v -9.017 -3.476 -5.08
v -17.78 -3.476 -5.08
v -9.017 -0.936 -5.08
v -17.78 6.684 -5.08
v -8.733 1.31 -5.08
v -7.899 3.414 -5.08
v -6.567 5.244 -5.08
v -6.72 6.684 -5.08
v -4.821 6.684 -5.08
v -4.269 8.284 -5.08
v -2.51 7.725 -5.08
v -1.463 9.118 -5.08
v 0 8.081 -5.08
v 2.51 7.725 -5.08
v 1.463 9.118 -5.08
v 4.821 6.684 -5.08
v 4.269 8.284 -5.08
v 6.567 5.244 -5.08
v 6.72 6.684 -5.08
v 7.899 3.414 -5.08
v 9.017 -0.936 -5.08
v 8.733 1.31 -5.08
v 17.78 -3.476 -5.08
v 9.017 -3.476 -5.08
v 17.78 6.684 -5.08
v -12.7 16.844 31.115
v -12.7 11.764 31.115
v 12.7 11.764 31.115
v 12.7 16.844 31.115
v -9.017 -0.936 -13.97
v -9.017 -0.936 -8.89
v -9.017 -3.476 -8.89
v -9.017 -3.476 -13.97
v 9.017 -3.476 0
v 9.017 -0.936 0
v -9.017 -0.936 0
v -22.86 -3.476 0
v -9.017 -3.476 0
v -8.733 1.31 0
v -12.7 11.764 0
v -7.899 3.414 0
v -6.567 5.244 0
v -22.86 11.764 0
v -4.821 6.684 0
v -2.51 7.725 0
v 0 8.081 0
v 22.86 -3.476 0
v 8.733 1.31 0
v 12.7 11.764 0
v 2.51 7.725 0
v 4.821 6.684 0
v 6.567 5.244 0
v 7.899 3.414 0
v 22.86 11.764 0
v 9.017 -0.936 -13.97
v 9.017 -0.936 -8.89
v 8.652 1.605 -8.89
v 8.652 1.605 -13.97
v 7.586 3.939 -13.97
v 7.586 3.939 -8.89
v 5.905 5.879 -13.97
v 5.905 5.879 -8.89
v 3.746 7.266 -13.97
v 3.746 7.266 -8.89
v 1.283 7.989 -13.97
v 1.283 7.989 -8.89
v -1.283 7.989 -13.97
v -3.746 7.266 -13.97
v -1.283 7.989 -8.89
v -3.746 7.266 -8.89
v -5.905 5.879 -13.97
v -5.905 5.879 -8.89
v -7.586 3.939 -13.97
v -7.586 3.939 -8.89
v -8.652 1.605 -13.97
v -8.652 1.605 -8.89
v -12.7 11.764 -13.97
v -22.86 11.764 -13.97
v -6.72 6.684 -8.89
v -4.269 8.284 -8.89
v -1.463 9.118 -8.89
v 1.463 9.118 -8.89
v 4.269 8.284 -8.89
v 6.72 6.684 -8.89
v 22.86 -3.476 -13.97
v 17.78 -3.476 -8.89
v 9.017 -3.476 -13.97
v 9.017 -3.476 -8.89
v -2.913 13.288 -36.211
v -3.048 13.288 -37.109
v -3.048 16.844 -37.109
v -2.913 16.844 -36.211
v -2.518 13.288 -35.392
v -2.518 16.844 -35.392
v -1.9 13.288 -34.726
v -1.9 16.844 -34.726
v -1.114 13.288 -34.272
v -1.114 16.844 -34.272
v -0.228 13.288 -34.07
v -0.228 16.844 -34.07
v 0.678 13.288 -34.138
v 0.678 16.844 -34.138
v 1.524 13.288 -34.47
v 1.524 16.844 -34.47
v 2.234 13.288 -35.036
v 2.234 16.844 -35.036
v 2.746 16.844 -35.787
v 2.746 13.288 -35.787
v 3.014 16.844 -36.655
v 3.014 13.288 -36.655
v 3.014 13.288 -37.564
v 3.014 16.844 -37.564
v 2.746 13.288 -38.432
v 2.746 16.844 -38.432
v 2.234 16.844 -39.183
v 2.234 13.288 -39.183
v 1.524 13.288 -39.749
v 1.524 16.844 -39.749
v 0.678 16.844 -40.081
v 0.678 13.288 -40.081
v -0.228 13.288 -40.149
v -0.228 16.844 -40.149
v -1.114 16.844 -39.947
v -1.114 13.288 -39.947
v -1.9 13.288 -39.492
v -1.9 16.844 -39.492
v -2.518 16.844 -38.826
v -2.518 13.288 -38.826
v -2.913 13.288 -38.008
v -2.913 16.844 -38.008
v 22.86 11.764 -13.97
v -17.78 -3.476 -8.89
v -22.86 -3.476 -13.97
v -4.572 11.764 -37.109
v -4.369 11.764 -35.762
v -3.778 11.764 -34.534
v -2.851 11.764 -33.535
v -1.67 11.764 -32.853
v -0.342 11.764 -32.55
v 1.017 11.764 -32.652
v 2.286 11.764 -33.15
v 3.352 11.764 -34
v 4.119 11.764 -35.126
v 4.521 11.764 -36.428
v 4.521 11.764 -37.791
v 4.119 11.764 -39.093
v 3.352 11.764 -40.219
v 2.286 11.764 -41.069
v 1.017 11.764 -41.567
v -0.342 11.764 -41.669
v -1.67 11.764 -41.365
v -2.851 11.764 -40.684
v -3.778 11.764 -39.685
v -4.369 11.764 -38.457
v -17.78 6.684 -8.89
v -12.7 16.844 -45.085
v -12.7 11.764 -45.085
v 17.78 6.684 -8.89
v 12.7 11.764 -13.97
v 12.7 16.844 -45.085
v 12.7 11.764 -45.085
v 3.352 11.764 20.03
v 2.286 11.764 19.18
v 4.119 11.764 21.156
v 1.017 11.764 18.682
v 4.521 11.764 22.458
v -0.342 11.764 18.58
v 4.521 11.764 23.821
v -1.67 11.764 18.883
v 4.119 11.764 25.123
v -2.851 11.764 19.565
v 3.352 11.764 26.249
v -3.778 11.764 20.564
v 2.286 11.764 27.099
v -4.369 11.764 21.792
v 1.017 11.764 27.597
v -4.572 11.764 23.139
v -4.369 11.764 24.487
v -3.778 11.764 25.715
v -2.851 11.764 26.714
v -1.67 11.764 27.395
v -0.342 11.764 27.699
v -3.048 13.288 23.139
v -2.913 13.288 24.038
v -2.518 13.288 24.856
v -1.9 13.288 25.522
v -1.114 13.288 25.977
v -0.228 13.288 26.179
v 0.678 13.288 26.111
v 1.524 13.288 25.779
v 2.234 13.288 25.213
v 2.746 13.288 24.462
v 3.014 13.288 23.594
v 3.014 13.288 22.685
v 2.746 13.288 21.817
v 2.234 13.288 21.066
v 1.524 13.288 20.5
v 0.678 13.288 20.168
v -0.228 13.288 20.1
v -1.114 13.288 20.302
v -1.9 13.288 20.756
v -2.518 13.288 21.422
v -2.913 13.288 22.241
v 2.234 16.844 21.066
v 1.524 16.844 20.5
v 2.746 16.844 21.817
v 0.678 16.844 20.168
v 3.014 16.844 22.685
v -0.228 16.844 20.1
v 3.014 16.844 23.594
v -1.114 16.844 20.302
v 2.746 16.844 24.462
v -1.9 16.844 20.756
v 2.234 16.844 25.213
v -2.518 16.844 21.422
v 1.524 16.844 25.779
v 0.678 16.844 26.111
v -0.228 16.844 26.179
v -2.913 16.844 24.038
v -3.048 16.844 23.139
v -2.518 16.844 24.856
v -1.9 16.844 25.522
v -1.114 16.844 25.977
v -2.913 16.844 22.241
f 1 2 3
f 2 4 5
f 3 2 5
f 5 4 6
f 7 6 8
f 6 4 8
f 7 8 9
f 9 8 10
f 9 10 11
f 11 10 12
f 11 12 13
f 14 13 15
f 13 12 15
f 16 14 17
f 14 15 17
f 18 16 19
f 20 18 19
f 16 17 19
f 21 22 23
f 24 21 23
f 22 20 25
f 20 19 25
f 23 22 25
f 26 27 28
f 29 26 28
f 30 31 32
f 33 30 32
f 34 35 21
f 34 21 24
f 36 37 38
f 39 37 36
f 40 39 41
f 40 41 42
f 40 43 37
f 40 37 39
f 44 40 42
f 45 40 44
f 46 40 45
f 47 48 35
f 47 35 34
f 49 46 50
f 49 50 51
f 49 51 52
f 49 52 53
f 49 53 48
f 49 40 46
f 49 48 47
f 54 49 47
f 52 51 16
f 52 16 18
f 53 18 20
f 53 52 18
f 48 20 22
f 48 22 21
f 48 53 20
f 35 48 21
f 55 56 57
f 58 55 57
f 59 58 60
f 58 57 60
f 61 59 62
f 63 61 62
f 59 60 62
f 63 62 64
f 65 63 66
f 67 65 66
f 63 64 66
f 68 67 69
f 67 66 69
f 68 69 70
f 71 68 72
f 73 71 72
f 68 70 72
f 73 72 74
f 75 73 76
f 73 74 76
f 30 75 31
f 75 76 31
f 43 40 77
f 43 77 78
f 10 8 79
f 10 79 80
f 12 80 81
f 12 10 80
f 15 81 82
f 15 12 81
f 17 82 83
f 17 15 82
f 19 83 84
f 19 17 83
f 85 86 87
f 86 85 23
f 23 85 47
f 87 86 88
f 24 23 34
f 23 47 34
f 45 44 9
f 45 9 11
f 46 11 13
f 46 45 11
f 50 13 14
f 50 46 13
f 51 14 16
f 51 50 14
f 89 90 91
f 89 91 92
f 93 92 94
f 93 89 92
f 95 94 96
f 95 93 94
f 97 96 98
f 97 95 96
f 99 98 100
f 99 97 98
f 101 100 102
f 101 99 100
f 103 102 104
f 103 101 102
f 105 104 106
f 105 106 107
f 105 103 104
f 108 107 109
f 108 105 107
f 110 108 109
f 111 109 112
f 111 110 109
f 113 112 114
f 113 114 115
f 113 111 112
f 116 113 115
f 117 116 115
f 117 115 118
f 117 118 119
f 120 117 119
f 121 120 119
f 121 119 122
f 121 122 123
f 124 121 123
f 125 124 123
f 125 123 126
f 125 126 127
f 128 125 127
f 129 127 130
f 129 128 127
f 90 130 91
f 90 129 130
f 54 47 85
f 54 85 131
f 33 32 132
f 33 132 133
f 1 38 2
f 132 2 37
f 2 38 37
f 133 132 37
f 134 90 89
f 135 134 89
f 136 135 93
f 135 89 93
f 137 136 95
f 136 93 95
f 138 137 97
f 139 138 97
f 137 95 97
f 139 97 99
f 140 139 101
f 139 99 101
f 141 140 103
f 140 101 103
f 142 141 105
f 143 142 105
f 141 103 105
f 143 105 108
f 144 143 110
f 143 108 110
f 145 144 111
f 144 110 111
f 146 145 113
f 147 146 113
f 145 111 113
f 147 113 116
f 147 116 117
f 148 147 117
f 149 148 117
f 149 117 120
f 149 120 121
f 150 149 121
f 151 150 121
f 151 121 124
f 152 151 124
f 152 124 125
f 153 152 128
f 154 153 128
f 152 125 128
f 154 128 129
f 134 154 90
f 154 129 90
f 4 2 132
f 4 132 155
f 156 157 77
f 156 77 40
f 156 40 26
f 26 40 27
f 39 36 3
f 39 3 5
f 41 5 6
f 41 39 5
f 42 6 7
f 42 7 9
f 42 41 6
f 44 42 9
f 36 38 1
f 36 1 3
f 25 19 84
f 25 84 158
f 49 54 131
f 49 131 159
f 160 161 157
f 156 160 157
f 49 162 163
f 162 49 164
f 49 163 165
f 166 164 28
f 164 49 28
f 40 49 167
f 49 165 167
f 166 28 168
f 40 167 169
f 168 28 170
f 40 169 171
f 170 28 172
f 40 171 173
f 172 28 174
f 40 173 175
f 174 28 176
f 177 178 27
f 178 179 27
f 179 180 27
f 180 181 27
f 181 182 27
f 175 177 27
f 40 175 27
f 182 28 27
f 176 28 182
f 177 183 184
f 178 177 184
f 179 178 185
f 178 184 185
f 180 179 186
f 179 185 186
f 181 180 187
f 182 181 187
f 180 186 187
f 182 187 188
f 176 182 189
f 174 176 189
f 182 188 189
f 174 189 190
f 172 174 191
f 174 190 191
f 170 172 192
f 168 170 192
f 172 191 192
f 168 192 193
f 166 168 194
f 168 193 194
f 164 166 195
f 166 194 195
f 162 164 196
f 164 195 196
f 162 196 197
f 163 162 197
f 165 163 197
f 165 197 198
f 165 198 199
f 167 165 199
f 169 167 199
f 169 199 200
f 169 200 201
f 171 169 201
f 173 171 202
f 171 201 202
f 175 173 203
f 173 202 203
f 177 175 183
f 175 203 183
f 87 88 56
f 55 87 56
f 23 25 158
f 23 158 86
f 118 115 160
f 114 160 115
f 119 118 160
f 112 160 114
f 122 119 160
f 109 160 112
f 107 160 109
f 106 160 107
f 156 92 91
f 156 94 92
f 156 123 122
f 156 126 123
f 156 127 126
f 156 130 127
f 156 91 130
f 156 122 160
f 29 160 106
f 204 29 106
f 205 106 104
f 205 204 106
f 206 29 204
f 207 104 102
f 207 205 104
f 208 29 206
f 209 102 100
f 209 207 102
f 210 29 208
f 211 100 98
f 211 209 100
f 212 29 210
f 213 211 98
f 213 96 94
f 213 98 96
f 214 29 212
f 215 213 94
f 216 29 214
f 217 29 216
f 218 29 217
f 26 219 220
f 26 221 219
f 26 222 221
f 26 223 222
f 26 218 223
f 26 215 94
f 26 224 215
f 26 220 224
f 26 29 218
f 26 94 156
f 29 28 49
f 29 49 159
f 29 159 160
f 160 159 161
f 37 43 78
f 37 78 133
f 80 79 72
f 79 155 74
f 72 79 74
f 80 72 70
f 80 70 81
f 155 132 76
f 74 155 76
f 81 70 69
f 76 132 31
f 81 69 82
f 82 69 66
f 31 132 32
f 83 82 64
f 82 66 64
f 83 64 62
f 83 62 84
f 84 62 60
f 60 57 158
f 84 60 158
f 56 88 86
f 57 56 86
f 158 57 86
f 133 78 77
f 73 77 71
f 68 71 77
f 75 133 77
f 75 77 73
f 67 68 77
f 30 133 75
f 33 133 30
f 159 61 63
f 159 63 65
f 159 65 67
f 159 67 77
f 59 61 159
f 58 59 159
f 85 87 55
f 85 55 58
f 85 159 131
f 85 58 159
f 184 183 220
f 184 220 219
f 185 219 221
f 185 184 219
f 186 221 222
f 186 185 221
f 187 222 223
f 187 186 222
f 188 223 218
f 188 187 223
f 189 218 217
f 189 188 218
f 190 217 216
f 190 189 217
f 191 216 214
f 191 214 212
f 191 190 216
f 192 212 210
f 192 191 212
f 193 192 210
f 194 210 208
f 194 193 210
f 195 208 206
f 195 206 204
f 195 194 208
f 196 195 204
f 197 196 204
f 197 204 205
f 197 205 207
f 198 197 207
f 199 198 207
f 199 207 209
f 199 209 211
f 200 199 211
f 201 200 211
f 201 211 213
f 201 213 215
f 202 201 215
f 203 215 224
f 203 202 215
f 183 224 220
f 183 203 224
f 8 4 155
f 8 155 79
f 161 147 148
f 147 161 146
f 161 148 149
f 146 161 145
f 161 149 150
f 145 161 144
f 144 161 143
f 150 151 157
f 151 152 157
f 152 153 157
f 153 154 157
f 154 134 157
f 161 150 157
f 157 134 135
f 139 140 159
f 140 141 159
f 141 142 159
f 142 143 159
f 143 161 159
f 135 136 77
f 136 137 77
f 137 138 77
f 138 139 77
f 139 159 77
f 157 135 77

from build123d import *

# Parameters (mm, degrees)
F1_DEPTH = 5.08
F2_DEPTH = 13.97
F3_START = 3.81
F3_DEPTH = 5.08
F4_R     = 3.048
F4_W     = 12.7
F4_H     = 6.985
F5_DEPTH = 5.08
F6_SIZE  = 1.524


with BuildPart() as f1:
    # F0 (on Top) → F1 (new body)
    with BuildSketch(Plane.XY):
        with BuildLine():
            ThreePointArc((-10.16, -0.9357894737), (-9.2602083301, 3.2444188564), (-6.7202083301, 6.6842105263))
            Line((-6.7202083301, 6.6842105263), (-17.78, 6.6842105263))
            Line((-17.78, 6.6842105263), (-17.78, -3.4757894737))
            Line((-17.78, -3.4757894737), (-10.16, -3.4757894737))
            Line((-10.16, -3.4757894737), (-10.16, -0.9357894737))
        make_face()
        with BuildLine():
            Line((17.78, 6.6842105263), (6.7202083301, 6.6842105263))
            ThreePointArc((6.7202083301, 6.6842105263), (9.2602083301, 3.2444188564), (10.16, -0.9357894737))
            Line((10.16, -0.9357894737), (10.16, -3.4757894737))
            Line((10.16, -3.4757894737), (17.78, -3.4757894737))
            Line((17.78, -3.4757894737), (17.78, 6.6842105263))
        make_face()
        with BuildLine():
            Line((-9.017, -3.4757894737), (-9.017, -0.9357894737))
            ThreePointArc((-9.017, -0.9357894737), (-7.8986424103, 3.4136630291), (-4.8209842356, 6.6842105263))
            Line((-4.8209842356, 6.6842105263), (-6.7202083301, 6.6842105263))
            ThreePointArc((-6.7202083301, 6.6842105263), (-9.2602083301, 3.2444188564), (-10.16, -0.9357894737))
            ThreePointArc((-10.16, -0.9357894737), (-10.0790217141, -2.2159930853), (-9.8373776994, -3.4757894737))
            Line((-9.8373776994, -3.4757894737), (-9.017, -3.4757894737))
        make_face()
        with BuildLine():
            ThreePointArc((4.8209842356, 6.6842105263), (7.8986424103, 3.4136630291), (9.017, -0.9357894737))
            Line((9.017, -0.9357894737), (9.017, -3.4757894737))
            Line((9.017, -3.4757894737), (9.8373776994, -3.4757894737))
            ThreePointArc((9.8373776994, -3.4757894737), (10.0790217141, -2.2159930853), (10.16, -0.9357894737))
            ThreePointArc((10.16, -0.9357894737), (9.2602083301, 3.2444188564), (6.7202083301, 6.6842105263))
            Line((6.7202083301, 6.6842105263), (4.8209842356, 6.6842105263))
        make_face()
        with BuildLine():
            ThreePointArc((-4.8209842356, 6.6842105263), (0, 8.0812105263), (4.8209842356, 6.6842105263))
            Line((4.8209842356, 6.6842105263), (6.7202083301, 6.6842105263))
            ThreePointArc((6.7202083301, 6.6842105263), (0, 9.2242105263), (-6.7202083301, 6.6842105263))
            Line((-6.7202083301, 6.6842105263), (-4.8209842356, 6.6842105263))
        make_face()
        with BuildLine():
            Line((-10.16, -3.4757894737), (-9.8373776994, -3.4757894737))
            ThreePointArc((-9.8373776994, -3.4757894737), (-10.0790217141, -2.2159930853), (-10.16, -0.9357894737))
            Line((-10.16, -0.9357894737), (-10.16, -3.4757894737))
        make_face()
        with BuildLine():
            ThreePointArc((10.16, -0.9357894737), (10.0790217141, -2.2159930853), (9.8373776994, -3.4757894737))
            Line((9.8373776994, -3.4757894737), (10.16, -3.4757894737))
            Line((10.16, -3.4757894737), (10.16, -0.9357894737))
        make_face()
    extrude(amount=-F1_DEPTH)

    # F0 (on Top) → F2 (join)
    with BuildSketch(Plane.XY):
        with BuildLine():
            ThreePointArc((-6.7202083301, 6.6842105263), (0, 9.2242105263), (6.7202083301, 6.6842105263))
            Line((6.7202083301, 6.6842105263), (17.78, 6.6842105263))
            Line((17.78, 6.6842105263), (17.78, -3.4757894737))
            Line((17.78, -3.4757894737), (22.86, -3.4757894737))
            Line((22.86, -3.4757894737), (22.86, 11.7642105263))
            Line((22.86, 11.7642105263), (-22.86, 11.7642105263))
            Line((-22.86, 11.7642105263), (-22.86, -3.4757894737))
            Line((-22.86, -3.4757894737), (-17.78, -3.4757894737))
            Line((-17.78, -3.4757894737), (-17.78, 6.6842105263))
            Line((-17.78, 6.6842105263), (-6.7202083301, 6.6842105263))
        make_face()
    extrude(amount=-F2_DEPTH)

    # F1_face (on face) → F3 (join)
    with BuildSketch(Plane(origin=(0, 2.3290563147, -5.08), x_dir=(1, 0, 0), z_dir=(0, 0, -1)).offset(F3_START)):
        with BuildLine():
            Line((-17.78, 5.8048457884), (-17.78, -4.3551542116))
            Line((-17.78, -4.3551542116), (-6.7202083301, -4.3551542116))
            ThreePointArc((-6.7202083301, -4.3551542116), (0, -6.8951542116), (6.7202083301, -4.3551542116))
            Line((6.7202083301, -4.3551542116), (17.78, -4.3551542116))
            Line((17.78, -4.3551542116), (17.78, 5.8048457884))
            Line((17.78, 5.8048457884), (9.017, 5.8048457884))
            Line((9.017, 5.8048457884), (9.017, 3.2648457884))
            ThreePointArc((9.017, 3.2648457884), (0, -5.7521542116), (-9.017, 3.2648457884))
            Line((-9.017, 3.2648457884), (-9.017, 5.8048457884))
            Line((-9.017, 5.8048457884), (-17.78, 5.8048457884))
        make_face()
    extrude(amount=F3_DEPTH)

    # F4 (on face) → F5 (join)
    with BuildSketch(Plane(origin=(0, 11.7642105263, 0), x_dir=(-1, 0, 0), z_dir=(0, 1, 0))):
        Polygon((12.7, 0), (12.7, 31.115), (-12.7, 31.115), (-12.7, 0), (0, 0), align=None)
        with Locations((0, 23.1394)):
            Circle(F4_R, mode=Mode.SUBTRACT)
        Polygon((12.7, -45.085), (12.7, -13.97), (0, -13.97), (-12.7, -13.97), (-12.7, -45.085), align=None)
        with Locations((0, -37.1094)):
            Circle(F4_R, mode=Mode.SUBTRACT)
        with Locations((6.35, -10.4775)):
            Rectangle(F4_W, F4_H)
        Polygon((0, -6.985), (0, 0), (-12.7, 0), (-12.7, -13.97), (0, -13.97), align=None)
        with Locations((6.35, -3.4925)):
            Rectangle(F4_W, F4_H)
    extrude(amount=F5_DEPTH)

    # F6
    f6_edges = [f1.edges().sort_by_distance(p)[0] for p in [
        (3.048, 11.764211, 23.1394),
        (3.048, 11.764211, -37.1094),
    ]]
    chamfer(f6_edges, length=F6_SIZE)


solid = f1.part
